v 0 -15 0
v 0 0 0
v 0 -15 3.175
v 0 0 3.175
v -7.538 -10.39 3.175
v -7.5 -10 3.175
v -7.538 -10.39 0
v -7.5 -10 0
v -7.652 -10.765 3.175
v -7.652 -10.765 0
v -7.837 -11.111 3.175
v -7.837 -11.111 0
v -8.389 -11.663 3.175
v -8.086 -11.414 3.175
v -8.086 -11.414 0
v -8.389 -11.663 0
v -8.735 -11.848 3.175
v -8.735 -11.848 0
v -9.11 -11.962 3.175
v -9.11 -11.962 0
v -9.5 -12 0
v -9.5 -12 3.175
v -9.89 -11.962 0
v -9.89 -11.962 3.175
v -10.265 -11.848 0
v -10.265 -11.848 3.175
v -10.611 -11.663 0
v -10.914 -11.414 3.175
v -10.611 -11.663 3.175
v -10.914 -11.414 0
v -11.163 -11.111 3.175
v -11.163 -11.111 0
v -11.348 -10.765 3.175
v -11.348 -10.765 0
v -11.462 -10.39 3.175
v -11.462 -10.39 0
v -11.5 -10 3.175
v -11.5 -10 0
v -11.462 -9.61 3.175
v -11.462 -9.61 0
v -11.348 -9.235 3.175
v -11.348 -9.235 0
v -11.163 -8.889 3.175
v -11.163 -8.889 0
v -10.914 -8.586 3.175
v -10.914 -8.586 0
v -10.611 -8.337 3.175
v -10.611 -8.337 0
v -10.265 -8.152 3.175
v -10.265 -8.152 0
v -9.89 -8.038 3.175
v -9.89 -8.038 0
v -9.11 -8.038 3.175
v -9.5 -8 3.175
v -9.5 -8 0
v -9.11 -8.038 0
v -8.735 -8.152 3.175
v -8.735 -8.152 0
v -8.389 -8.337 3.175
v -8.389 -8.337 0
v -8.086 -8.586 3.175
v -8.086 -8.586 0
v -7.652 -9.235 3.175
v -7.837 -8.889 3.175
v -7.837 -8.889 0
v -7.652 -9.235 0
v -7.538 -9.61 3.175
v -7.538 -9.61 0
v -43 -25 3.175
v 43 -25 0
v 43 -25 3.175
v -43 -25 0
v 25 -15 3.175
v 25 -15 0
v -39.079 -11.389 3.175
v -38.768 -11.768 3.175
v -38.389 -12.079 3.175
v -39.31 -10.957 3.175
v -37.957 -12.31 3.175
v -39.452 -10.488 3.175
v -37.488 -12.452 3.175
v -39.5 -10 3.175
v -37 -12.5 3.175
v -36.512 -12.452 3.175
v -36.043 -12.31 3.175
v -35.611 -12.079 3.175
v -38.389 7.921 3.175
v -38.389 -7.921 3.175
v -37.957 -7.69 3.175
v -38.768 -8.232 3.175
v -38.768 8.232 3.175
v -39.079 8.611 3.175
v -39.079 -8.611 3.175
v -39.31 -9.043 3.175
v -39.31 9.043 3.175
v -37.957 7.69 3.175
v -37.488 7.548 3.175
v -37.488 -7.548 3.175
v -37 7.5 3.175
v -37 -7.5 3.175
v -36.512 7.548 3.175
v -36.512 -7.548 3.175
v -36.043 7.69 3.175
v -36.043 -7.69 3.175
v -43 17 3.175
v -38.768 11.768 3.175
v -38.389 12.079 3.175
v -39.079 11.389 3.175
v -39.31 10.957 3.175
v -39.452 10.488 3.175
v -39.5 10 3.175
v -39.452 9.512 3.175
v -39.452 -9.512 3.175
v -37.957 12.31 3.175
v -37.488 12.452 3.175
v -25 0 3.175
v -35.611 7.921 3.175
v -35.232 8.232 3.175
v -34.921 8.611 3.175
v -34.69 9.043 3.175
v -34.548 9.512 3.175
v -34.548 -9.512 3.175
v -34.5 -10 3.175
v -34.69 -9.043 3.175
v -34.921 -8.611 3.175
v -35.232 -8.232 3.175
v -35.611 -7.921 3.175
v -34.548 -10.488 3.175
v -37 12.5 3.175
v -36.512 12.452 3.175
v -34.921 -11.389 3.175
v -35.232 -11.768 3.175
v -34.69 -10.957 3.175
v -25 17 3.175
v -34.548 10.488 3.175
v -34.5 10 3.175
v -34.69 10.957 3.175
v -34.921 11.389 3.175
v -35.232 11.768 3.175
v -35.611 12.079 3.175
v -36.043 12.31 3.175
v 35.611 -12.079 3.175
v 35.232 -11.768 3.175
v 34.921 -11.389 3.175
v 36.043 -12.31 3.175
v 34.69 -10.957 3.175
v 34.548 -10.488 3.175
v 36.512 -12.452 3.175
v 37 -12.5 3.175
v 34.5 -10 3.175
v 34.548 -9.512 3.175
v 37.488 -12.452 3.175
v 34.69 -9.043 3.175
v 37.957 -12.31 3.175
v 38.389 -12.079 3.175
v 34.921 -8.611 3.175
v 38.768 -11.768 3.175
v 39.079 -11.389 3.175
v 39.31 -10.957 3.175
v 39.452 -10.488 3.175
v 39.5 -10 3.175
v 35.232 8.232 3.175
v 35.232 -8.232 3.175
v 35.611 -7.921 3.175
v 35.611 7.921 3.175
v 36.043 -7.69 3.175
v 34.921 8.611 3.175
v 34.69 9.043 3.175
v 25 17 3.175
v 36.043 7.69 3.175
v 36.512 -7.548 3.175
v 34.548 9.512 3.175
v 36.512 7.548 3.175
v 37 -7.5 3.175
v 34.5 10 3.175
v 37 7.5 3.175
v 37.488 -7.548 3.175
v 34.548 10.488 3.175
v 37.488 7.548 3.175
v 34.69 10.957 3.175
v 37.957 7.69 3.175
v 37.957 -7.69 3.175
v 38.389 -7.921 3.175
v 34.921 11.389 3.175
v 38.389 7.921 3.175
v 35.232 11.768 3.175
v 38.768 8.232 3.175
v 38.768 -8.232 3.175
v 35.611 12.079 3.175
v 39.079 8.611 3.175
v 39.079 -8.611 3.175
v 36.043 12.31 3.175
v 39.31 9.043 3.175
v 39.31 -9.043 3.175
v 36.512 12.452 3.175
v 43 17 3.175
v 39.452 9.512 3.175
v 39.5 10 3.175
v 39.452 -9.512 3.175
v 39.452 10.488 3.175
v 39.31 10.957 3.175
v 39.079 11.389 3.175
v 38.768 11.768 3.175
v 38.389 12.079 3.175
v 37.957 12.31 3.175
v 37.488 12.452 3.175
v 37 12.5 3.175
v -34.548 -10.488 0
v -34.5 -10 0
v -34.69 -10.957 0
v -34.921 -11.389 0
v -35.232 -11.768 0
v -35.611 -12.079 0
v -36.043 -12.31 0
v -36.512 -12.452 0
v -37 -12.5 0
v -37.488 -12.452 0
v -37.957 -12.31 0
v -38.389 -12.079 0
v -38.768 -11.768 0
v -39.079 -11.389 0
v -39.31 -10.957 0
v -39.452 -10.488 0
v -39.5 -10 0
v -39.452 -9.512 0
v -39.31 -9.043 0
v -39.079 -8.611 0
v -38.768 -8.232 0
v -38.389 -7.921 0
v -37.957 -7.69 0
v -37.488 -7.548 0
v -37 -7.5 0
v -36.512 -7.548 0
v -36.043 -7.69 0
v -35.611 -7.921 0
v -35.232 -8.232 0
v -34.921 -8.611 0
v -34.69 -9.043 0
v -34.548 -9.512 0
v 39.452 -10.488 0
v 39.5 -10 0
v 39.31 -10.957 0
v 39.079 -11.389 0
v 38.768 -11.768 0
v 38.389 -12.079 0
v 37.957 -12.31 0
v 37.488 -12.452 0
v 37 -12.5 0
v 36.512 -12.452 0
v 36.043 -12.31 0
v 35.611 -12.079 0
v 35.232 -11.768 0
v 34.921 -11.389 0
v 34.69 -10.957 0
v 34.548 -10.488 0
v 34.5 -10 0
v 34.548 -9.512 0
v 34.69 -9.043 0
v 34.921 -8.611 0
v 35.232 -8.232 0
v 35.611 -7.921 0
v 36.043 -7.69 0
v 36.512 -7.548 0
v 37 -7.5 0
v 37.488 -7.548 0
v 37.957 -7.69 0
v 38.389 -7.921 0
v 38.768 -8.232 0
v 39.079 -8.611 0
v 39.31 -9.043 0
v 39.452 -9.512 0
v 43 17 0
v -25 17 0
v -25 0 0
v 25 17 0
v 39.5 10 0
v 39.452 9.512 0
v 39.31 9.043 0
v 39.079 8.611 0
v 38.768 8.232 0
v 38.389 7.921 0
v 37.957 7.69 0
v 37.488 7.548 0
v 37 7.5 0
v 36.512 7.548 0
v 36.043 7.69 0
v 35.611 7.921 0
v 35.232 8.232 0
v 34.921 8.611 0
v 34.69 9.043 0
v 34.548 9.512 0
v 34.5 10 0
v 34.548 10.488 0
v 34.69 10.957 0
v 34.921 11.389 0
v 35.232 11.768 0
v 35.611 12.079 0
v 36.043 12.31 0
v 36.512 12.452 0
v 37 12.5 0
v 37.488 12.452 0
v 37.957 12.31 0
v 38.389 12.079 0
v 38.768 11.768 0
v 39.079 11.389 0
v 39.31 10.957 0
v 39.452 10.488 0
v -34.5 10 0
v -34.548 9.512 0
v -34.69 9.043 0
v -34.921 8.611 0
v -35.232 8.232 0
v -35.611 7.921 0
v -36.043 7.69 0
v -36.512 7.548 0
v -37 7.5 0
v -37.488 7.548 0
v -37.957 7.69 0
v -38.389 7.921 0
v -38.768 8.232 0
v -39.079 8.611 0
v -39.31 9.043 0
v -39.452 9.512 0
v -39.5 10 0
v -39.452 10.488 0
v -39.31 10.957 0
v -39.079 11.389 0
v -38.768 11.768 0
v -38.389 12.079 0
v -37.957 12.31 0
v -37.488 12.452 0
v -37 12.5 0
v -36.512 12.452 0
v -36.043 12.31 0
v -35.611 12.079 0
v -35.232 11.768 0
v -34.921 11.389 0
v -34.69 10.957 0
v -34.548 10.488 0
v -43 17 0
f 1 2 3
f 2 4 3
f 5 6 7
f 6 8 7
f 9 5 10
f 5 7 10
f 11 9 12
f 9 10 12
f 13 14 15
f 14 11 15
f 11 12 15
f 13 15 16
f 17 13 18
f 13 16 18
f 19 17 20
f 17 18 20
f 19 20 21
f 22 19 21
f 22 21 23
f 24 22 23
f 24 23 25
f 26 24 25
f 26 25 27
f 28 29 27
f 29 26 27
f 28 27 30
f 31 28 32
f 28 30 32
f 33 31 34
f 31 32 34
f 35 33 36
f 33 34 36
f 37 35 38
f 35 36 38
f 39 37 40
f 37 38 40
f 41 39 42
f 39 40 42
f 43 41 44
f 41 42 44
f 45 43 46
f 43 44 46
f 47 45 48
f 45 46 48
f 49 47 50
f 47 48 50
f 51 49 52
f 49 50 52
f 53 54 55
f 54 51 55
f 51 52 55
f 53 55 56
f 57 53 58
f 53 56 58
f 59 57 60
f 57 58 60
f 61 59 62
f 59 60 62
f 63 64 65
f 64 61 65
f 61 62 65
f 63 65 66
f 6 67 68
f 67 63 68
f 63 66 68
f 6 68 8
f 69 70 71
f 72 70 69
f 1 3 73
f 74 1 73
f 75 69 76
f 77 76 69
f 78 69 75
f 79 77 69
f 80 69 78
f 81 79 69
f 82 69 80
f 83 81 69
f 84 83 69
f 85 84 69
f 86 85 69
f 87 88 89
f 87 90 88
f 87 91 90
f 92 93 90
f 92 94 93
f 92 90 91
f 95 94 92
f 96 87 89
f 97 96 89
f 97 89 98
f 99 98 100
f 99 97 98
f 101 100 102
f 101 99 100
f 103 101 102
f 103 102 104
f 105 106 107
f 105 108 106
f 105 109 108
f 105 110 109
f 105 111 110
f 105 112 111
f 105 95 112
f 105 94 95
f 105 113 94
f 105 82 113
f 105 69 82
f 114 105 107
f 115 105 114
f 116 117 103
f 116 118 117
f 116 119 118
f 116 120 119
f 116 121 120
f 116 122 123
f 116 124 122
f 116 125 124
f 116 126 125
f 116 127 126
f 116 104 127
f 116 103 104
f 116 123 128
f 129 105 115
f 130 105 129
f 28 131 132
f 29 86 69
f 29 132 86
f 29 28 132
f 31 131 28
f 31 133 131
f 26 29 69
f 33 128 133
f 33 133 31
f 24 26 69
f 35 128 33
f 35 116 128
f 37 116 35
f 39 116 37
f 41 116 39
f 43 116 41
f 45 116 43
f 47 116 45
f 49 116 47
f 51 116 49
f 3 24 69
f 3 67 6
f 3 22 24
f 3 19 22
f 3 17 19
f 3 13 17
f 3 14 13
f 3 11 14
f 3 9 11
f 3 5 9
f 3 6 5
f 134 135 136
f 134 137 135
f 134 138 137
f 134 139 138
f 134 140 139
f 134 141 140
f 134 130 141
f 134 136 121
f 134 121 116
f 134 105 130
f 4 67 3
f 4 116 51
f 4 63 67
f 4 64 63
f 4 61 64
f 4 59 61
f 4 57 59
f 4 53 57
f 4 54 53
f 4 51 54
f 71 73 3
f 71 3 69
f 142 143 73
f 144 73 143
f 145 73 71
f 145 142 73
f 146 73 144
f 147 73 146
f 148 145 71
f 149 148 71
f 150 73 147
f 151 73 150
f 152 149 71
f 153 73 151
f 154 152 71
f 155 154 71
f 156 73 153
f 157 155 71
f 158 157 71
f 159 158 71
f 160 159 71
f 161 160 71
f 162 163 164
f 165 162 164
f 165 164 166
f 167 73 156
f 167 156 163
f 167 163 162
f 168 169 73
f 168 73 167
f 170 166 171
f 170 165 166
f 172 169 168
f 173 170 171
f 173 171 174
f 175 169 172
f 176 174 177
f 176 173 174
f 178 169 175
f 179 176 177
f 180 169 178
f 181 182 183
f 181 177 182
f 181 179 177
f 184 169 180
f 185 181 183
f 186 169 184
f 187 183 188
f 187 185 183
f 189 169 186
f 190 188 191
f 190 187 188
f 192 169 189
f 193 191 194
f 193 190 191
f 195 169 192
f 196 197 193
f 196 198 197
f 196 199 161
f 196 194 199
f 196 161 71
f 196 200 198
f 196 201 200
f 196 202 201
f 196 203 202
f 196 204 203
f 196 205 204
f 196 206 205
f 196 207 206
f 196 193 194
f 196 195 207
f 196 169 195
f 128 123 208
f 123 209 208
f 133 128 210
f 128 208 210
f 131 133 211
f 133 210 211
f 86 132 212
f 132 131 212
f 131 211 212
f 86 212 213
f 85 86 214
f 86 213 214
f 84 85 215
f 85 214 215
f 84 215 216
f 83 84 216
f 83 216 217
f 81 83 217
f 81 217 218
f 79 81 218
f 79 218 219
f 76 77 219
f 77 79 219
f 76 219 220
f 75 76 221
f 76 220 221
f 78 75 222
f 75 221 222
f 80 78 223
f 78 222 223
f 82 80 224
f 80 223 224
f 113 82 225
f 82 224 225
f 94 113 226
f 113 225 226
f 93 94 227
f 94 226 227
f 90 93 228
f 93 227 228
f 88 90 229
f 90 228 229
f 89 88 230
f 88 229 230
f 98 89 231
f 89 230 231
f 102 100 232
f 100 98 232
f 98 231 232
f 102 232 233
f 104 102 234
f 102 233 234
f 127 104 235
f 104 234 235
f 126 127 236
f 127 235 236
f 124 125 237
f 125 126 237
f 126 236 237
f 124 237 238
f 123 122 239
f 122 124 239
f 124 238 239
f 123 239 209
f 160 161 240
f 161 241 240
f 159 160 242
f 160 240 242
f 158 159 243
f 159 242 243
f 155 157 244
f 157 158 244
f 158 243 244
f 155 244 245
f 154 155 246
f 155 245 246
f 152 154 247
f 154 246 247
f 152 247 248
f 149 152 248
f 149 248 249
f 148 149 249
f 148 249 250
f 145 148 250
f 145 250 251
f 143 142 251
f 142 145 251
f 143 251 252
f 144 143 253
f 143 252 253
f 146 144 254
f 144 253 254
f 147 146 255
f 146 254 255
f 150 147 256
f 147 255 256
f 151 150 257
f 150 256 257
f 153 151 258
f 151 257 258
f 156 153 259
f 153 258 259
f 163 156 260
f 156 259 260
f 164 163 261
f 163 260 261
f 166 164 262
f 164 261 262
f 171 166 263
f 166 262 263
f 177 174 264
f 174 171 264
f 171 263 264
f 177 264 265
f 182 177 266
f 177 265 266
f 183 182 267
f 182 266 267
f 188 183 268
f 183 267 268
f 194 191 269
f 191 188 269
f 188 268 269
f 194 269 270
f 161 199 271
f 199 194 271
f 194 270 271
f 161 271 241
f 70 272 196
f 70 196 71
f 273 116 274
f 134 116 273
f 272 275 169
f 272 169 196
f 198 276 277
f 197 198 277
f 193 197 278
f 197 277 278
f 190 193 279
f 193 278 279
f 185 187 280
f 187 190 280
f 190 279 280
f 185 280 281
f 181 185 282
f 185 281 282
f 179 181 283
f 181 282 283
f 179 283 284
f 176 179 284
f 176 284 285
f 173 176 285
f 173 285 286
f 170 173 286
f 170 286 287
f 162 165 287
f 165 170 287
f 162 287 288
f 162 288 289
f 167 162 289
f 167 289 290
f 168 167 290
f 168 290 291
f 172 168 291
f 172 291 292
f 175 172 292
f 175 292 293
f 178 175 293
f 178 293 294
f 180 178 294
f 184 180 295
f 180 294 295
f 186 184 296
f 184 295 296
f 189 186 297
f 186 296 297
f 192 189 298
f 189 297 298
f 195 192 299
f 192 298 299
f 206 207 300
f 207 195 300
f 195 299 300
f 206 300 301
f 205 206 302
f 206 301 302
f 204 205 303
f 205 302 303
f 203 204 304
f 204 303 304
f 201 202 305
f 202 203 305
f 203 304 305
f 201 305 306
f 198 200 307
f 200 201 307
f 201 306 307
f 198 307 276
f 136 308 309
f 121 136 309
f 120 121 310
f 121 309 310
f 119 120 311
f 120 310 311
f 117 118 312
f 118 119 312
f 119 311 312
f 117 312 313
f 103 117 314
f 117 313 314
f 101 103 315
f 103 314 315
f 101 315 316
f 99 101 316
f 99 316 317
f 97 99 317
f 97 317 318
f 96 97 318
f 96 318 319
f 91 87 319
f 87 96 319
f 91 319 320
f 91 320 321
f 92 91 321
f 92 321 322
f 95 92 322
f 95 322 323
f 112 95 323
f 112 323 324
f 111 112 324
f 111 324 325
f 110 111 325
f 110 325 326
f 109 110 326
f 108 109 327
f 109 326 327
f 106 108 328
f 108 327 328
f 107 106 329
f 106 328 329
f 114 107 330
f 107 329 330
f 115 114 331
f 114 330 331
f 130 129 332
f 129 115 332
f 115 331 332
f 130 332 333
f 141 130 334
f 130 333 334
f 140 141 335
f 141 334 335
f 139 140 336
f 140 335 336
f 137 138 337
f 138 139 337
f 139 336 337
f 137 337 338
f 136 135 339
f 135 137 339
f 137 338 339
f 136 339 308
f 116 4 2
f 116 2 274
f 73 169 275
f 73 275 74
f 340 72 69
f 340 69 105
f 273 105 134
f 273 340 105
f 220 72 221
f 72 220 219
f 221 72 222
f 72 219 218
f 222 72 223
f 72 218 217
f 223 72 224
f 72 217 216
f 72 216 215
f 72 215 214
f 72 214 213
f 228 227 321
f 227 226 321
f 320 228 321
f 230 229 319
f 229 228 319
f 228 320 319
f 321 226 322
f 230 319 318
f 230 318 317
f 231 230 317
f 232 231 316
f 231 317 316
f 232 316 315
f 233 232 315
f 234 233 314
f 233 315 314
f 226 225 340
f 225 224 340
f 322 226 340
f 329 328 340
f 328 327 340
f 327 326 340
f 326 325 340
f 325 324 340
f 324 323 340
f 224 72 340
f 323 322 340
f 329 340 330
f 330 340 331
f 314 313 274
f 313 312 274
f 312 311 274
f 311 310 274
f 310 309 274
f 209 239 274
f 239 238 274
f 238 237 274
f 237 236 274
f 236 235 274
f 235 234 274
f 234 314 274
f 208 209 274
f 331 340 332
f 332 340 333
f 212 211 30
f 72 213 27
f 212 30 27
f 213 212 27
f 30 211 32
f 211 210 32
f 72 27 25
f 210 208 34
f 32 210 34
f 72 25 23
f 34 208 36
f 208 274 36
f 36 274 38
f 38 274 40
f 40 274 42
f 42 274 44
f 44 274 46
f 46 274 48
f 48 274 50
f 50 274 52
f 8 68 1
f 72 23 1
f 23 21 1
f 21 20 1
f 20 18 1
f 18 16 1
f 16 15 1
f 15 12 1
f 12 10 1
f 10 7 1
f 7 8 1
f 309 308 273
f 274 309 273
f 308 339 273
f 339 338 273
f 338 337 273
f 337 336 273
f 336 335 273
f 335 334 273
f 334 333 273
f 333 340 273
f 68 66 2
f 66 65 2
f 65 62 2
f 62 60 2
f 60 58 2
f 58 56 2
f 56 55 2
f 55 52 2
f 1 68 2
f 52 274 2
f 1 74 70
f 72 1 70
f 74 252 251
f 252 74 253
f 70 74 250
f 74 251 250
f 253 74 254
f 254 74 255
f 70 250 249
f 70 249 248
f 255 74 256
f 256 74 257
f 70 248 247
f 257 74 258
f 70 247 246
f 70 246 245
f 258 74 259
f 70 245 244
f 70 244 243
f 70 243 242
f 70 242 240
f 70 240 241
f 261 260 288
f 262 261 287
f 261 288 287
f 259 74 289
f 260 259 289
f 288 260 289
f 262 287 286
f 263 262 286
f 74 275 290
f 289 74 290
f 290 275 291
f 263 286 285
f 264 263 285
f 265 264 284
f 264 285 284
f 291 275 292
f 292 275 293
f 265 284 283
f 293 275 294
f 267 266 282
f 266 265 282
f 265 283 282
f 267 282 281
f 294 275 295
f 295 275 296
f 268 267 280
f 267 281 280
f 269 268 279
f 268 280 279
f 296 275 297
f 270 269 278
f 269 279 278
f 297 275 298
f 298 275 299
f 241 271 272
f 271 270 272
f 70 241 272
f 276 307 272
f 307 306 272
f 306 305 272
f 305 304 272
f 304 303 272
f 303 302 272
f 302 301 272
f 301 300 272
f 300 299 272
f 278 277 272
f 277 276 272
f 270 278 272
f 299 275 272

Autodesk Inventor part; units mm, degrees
ref_plane "YZ Plane" through (0, 0, 0) normal (1, 0, 0) x (0, 1, 0)
ref_plane "XZ Plane" through (0, 0, 0) normal (0, 1, 0) x (-1, 0, 0)
ref_plane "XY Plane" through (0, 0, 0) normal (0, 0, 1) x (1, 0, 0)
sketch "Sketch1" plane through (0, 0, 0) normal (0, 0, 1) x (1, 0, 0)
  line L0 (-43, 17) -> (43, 17)
  line L1 (43, 17) -> (43, -25)
  line L2 (43, -25) -> (-43, -25)
  line L3 (-43, -25) -> (-43, 17)
  circle A0 centre (-37, 10) radius 2.5
  circle A1 centre (-37, -10) radius 2.5
  line L4 (0, 17) -> (0, -25) construction
  circle A2 centre (37, 10) radius 2.5
  circle A3 centre (37, -10) radius 2.5
  circle A4 centre (-9.5, -10) radius 2
  point P0 (0, 0)
  point P1 (-43, -4)
  dimension "d0" = 86
  dimension "d1" = 42
  dimension "d2" = 5
  dimension "d3" = 7
  dimension "d4" = 6
  dimension "d5" = 6
  dimension "d6" = 15
  dimension "d7" = 4
  dimension "d8" = 27.5
extrude "Extrusion3" add sketch "Sketch1" along normal blind 3.175
sketch "Sketch3" plane through (0, 0, 3.175) normal (0, 0, 1) x (1, 0, 0)
  line L0 (-25, 17) -> (25, 17)
  line L1 (25, 17) -> (25, 0)
  line L2 (25, 0) -> (-25, 0)
  line L3 (-25, 0) -> (-25, 17)
  line L4 (43, 17) -> (-43, 17) projected
  circle A0 centre (-9.5, -10) radius 2 projected
  line L5 (25, 0) -> (0, 0)
  line L6 (0, 0) -> (0, -15)
  line L7 (0, -15) -> (25, -15)
  line L8 (25, -15) -> (25, 0)
  line L9 (-43, -25) -> (43, -25) projected
  point P0 (0, 0)
  point P1 (0, 17)
  dimension "d20" = 50
  dimension "d22" = 10
  dimension "d23" = 9.5
  dimension "d24" = 10
extrude "Extrusion4" cut sketch "Sketch3" against normal through all contours L0 L1 L2 L3 | L8 L7 L6 L2
equation "\"d5\" = d4"
equation "\"d24\" = d22"
properties part number "BaseAluminio"
